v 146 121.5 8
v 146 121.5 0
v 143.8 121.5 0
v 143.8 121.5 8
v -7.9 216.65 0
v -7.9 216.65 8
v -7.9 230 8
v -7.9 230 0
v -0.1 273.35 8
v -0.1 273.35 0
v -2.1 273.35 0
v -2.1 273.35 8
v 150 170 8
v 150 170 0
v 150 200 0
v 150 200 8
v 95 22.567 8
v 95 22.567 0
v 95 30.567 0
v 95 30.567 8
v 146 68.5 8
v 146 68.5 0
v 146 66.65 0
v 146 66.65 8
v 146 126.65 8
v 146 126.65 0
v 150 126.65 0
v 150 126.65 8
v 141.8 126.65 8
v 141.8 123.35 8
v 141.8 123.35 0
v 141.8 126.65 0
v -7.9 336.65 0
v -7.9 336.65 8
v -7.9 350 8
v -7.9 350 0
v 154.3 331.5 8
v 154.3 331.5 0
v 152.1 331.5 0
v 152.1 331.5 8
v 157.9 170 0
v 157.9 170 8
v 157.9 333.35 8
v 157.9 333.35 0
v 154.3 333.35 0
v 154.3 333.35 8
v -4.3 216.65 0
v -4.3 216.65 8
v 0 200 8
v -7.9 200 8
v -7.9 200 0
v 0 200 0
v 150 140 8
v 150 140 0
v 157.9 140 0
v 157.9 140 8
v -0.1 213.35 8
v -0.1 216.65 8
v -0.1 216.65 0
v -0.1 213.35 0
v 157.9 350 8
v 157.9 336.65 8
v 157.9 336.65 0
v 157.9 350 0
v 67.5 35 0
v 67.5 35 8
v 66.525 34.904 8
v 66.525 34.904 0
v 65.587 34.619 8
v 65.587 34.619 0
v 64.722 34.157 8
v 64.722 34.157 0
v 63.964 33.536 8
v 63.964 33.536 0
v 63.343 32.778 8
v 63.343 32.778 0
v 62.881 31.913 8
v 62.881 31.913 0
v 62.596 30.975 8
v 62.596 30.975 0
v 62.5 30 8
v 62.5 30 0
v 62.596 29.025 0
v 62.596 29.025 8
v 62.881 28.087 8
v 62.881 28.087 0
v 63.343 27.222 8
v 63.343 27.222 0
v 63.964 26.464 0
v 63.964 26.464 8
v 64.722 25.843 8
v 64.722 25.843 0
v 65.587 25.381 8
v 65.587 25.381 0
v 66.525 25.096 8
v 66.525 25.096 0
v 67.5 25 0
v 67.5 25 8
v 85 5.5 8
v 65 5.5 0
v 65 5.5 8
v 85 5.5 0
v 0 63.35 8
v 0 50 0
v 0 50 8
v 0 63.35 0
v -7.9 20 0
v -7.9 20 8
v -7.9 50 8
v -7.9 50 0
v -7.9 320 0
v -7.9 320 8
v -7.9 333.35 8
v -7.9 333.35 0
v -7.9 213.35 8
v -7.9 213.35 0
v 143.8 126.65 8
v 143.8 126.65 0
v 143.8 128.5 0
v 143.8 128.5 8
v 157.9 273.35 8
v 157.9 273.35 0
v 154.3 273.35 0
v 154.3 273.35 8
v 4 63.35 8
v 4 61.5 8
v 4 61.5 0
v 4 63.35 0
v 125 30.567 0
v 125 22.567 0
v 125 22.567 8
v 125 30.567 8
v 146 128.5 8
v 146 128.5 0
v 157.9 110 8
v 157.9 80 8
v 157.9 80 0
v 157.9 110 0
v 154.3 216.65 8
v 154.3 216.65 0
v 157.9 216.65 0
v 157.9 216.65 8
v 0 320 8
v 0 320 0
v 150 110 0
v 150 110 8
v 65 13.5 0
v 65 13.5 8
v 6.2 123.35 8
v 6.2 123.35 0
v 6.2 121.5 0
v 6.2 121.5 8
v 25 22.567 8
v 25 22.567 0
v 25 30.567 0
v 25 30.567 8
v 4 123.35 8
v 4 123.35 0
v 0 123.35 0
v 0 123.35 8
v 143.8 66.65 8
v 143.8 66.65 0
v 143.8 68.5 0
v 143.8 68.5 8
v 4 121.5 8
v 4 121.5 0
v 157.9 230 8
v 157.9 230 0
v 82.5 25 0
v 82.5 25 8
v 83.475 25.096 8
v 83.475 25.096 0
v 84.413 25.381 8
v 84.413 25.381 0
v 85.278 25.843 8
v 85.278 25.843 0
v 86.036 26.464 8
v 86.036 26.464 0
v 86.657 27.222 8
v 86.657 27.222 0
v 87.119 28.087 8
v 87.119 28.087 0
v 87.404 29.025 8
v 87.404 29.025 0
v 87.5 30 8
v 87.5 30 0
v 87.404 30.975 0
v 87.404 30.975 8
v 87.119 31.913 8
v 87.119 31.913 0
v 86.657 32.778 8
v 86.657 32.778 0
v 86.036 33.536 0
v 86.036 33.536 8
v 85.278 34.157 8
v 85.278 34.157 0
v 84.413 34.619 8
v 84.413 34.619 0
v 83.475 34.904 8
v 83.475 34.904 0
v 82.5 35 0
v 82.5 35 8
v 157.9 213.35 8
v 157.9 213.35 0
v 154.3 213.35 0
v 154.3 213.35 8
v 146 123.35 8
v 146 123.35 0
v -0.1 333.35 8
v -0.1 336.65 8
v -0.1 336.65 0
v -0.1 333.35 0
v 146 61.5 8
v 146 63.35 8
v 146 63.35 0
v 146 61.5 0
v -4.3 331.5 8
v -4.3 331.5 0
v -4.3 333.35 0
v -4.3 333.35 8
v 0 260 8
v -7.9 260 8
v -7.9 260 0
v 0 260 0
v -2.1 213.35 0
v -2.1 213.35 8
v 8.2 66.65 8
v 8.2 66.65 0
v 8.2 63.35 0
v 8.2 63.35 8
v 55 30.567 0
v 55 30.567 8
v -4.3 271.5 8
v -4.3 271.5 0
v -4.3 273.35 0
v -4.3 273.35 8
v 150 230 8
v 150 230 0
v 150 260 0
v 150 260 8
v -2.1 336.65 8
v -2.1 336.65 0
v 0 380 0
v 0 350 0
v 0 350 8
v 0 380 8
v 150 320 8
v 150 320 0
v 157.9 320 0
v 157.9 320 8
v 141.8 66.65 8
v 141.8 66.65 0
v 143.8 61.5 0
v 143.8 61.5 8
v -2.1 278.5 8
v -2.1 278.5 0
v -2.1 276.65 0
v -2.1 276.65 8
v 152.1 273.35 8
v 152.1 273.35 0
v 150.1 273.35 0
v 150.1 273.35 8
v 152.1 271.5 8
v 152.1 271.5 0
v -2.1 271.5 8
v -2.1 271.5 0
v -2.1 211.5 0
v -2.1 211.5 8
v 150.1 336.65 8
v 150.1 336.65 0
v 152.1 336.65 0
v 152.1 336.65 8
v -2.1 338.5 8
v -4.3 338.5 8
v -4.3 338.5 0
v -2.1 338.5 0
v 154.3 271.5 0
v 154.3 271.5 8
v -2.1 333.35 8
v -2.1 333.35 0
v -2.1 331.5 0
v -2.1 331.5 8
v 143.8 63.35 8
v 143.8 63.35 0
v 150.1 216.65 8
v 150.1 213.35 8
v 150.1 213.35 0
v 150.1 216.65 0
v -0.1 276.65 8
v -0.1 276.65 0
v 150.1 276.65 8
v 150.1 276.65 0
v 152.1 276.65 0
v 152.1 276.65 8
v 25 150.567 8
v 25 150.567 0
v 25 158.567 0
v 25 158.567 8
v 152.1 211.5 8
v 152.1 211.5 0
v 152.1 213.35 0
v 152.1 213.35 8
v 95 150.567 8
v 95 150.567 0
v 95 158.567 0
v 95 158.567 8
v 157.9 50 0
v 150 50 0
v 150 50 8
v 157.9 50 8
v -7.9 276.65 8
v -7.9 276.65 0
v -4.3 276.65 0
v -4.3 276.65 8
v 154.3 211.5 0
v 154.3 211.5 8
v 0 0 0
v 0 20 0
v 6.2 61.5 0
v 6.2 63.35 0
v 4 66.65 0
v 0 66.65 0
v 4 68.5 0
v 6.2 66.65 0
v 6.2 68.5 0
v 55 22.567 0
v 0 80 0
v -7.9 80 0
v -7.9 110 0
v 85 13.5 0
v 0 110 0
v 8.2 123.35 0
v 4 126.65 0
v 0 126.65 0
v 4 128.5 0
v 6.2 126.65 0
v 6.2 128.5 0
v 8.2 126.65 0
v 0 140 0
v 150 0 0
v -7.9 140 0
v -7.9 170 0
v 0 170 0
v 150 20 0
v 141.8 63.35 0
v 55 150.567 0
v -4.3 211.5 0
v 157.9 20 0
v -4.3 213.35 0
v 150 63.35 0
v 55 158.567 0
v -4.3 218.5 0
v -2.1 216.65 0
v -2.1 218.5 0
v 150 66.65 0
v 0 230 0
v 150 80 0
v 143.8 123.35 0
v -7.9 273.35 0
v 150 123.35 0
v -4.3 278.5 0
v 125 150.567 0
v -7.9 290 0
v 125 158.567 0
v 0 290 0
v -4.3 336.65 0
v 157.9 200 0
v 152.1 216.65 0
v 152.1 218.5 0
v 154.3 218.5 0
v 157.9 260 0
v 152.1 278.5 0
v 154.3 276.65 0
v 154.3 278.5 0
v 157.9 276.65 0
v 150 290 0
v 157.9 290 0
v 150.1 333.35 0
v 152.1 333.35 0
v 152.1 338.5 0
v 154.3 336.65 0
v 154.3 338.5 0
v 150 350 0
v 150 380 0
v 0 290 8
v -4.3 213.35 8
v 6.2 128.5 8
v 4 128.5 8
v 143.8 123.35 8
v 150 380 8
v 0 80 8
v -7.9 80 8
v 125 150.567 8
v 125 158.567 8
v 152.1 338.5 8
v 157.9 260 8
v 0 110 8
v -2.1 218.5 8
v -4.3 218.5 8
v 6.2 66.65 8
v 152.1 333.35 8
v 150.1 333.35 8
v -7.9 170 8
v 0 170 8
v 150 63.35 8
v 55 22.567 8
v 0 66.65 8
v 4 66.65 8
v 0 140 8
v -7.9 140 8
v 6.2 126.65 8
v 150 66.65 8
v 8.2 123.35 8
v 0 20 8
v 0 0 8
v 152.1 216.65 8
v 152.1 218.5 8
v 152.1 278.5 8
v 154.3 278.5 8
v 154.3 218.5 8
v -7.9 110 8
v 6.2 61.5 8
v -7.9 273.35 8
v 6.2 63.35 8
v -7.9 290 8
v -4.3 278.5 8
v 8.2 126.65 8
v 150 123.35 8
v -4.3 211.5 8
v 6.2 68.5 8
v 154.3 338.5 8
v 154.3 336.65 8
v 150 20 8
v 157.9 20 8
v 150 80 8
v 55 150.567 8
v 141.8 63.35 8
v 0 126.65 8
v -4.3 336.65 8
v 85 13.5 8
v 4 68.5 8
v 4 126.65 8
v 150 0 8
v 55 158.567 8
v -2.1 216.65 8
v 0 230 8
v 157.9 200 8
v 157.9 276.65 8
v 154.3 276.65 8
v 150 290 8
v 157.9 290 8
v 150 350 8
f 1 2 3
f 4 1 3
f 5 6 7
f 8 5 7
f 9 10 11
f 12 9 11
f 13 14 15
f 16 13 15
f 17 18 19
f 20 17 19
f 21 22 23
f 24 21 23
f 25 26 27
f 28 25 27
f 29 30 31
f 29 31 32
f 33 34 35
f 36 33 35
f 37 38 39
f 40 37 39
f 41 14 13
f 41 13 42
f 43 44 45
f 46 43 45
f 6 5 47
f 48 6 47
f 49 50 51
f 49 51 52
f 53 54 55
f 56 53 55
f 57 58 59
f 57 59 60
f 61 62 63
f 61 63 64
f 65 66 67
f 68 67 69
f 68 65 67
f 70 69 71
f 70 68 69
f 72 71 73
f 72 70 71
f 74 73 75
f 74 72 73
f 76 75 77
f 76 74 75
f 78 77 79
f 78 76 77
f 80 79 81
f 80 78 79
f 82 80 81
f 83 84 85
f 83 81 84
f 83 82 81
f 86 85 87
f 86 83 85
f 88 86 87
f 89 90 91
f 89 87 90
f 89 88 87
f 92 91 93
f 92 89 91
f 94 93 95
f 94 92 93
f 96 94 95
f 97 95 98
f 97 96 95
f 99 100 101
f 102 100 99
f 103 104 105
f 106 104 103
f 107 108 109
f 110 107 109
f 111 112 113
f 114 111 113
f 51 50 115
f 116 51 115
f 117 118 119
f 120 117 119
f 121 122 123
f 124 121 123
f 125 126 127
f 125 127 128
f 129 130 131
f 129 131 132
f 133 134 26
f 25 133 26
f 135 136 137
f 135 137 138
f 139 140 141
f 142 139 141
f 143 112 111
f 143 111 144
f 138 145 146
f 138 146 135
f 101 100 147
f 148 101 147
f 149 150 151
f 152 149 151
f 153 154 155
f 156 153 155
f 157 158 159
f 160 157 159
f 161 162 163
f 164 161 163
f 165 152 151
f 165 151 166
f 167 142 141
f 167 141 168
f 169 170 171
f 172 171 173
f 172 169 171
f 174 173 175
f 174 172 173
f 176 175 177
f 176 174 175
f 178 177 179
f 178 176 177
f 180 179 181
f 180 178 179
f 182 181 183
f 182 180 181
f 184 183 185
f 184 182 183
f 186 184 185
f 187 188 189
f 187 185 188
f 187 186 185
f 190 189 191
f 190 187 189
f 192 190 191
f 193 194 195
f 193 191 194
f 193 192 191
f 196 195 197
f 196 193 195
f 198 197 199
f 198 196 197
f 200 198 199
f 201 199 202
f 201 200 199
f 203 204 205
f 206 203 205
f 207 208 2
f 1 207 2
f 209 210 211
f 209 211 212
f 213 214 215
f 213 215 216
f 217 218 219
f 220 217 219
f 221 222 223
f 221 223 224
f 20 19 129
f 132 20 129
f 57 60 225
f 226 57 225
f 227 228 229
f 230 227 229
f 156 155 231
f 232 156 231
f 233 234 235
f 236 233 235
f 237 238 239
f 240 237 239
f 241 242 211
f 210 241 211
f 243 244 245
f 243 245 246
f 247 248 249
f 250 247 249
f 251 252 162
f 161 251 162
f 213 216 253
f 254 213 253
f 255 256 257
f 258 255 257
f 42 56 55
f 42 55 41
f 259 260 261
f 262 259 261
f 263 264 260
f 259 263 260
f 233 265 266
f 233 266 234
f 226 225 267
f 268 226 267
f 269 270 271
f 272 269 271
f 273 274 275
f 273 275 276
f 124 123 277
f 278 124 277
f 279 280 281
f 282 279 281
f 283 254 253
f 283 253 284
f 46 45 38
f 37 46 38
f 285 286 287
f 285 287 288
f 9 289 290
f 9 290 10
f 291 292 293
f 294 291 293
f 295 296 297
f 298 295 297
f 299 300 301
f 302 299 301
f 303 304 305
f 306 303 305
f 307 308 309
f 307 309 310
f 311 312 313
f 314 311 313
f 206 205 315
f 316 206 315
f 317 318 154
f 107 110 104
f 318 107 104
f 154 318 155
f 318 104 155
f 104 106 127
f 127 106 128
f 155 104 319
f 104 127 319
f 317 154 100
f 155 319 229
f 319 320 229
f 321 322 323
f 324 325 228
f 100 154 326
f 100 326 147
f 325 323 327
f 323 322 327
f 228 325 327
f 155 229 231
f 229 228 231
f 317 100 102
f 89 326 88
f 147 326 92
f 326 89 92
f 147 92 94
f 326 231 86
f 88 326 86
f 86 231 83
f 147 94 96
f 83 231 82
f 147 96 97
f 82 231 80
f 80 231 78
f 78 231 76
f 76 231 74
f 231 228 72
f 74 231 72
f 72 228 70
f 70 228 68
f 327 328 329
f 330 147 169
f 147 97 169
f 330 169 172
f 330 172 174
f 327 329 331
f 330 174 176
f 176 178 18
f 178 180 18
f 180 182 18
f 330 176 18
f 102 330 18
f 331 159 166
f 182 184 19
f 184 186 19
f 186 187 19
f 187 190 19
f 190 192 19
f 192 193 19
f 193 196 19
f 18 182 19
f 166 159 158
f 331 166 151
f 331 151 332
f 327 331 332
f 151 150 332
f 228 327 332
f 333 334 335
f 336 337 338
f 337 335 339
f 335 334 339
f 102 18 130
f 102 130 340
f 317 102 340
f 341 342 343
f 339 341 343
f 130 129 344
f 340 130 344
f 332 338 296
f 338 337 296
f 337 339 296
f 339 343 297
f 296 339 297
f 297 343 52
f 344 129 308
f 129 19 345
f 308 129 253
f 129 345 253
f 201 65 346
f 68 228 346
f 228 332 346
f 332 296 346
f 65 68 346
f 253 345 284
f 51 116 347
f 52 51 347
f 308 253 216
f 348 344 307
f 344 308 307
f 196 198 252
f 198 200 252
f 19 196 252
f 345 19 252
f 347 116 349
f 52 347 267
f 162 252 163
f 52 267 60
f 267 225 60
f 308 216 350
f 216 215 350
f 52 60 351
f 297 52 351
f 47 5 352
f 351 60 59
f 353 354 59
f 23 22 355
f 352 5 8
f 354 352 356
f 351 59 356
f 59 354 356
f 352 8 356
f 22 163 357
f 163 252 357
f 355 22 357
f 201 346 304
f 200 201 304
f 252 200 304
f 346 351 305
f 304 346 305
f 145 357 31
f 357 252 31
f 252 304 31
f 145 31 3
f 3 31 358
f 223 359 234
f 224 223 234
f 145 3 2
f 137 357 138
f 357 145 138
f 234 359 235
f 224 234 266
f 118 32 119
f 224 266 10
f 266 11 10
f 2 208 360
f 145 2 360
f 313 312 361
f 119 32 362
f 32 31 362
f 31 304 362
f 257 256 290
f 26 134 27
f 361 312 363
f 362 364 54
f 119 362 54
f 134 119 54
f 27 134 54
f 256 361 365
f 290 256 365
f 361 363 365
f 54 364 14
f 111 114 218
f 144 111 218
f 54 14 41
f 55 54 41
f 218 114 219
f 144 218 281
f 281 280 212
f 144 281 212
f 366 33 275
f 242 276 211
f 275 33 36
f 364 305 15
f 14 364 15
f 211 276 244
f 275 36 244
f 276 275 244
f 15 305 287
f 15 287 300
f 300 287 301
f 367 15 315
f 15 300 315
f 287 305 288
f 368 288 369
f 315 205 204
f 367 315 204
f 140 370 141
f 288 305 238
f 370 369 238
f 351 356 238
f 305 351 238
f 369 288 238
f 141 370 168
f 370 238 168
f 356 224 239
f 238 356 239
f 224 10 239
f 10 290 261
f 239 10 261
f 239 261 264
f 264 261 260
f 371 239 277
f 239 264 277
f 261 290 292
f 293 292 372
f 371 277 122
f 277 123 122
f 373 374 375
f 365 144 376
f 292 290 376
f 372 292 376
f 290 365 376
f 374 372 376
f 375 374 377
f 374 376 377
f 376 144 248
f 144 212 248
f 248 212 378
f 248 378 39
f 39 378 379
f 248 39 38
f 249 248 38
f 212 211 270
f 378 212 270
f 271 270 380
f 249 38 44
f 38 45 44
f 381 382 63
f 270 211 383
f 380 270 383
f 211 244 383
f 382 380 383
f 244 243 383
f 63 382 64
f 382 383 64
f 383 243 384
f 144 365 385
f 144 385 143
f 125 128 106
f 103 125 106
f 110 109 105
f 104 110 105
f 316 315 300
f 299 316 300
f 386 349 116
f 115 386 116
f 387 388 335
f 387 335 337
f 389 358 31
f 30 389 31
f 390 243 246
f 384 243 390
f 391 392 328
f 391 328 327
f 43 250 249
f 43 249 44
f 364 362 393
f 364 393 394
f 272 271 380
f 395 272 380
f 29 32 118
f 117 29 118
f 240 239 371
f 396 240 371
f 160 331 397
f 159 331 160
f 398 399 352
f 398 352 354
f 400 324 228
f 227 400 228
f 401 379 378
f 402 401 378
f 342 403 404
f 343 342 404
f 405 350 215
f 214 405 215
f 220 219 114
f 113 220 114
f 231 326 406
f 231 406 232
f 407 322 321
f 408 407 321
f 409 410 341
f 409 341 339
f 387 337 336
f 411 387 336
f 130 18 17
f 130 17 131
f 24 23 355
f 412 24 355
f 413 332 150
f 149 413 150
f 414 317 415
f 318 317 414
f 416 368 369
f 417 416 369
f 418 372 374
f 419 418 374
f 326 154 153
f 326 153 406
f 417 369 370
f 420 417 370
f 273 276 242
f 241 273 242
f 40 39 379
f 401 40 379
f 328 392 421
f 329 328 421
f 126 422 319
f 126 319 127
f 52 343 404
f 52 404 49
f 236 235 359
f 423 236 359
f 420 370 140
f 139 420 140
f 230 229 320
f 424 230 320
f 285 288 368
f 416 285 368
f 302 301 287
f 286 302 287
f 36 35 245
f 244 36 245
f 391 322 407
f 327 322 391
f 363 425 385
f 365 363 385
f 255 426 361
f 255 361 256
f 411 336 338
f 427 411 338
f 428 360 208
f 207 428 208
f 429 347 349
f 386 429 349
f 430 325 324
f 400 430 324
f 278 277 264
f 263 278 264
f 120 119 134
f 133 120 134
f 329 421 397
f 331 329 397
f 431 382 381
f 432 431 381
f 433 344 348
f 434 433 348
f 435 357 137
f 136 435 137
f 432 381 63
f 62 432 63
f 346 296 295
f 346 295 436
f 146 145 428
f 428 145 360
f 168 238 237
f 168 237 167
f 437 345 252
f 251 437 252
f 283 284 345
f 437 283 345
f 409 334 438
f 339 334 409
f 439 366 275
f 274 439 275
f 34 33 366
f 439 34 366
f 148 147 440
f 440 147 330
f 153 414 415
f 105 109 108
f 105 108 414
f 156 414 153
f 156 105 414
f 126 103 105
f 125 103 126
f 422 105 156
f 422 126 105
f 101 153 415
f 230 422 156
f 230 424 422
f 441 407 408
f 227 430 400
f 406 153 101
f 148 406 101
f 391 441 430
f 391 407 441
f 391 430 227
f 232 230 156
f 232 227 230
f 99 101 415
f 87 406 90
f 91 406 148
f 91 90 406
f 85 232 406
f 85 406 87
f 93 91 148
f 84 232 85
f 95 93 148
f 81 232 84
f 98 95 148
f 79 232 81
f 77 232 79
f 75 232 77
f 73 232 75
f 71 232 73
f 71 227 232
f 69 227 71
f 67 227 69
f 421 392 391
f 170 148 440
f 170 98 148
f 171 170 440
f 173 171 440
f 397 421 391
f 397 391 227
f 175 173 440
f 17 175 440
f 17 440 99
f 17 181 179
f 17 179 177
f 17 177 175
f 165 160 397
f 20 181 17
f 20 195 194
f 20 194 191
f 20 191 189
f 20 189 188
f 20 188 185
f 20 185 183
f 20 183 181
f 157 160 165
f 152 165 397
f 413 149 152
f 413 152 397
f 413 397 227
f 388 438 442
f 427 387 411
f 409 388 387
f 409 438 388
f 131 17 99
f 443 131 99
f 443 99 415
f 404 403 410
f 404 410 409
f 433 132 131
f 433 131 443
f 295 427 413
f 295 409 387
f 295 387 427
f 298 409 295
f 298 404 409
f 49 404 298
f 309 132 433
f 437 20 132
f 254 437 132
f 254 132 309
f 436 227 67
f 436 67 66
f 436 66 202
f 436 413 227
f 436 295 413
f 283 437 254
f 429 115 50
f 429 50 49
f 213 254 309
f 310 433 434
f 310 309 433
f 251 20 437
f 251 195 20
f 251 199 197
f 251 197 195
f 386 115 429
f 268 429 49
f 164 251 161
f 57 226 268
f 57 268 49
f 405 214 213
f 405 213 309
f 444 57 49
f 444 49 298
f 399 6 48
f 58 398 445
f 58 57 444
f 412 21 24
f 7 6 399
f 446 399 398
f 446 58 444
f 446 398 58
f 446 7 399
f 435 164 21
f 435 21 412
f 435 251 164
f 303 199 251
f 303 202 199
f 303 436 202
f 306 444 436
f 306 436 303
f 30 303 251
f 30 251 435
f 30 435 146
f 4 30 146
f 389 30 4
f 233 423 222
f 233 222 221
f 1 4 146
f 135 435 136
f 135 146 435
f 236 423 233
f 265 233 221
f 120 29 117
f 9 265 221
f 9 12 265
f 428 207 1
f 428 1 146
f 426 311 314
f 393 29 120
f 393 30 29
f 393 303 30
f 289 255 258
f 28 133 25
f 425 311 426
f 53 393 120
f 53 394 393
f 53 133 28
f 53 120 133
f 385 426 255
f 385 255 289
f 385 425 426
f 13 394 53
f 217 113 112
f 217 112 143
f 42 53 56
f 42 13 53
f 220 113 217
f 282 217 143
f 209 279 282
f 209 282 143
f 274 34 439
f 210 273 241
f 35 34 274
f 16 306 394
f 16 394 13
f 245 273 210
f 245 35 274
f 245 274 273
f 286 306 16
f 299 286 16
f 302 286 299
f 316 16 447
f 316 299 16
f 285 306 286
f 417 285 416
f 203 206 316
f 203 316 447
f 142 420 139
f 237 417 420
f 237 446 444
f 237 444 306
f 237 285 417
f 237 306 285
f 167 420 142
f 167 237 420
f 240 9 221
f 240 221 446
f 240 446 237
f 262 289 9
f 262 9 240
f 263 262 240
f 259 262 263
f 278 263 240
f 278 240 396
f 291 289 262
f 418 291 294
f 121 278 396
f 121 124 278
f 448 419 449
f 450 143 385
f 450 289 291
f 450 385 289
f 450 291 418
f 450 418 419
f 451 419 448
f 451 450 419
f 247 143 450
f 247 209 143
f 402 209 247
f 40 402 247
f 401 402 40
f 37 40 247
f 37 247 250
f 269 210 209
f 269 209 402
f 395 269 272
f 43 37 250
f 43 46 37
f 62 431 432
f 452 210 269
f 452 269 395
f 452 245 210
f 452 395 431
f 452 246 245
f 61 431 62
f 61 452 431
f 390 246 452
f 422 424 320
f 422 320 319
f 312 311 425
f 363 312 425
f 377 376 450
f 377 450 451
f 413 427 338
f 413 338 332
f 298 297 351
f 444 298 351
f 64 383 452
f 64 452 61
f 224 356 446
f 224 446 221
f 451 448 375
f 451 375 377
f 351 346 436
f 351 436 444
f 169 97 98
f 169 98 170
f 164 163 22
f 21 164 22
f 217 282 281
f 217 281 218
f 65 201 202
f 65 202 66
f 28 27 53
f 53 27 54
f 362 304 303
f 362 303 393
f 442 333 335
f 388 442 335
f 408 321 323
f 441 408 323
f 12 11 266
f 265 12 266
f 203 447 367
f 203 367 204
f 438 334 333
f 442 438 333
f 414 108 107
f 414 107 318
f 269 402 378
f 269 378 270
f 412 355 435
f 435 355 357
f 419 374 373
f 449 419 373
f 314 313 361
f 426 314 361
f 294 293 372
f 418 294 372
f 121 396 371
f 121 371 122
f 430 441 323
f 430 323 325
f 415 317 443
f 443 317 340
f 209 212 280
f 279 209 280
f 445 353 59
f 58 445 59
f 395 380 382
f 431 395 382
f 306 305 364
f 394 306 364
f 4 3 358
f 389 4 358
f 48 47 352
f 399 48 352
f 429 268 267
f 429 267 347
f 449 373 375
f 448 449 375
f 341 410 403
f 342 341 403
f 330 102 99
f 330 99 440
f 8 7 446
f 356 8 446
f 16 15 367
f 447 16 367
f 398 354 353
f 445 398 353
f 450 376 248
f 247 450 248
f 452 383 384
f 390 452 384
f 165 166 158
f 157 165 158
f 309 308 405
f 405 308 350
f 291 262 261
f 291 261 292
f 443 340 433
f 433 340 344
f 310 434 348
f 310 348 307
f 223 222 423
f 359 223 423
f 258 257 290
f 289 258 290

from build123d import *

# Parameters (mm, degrees)
SKETCH1_W           = 150
SKETCH1_H           = 380
SKETCH1_W_2         = 30
SKETCH1_H_2         = 8
SKETCH1_W_3         = 20
BOSS_EXTRUDE1_DEPTH = 8
SKETCH2_W           = 7.9
SKETCH2_H           = 30
BOSS_EXTRUDE2_DEPTH = 8
CUT_EXTRUDE2_DEPTH  = 9


with BuildPart() as part:
    # Sketch1 → Boss-Extrude1 (new body)
    with BuildSketch(Plane.XY):
        with Locations((75, 190)):
            Rectangle(SKETCH1_W, SKETCH1_H)
        with Locations((40, 154.566938385)):
            Rectangle(SKETCH1_W_2, SKETCH1_H_2, mode=Mode.SUBTRACT)
        with Locations((110, 154.566938385)):
            Rectangle(SKETCH1_W_2, SKETCH1_H_2, mode=Mode.SUBTRACT)
        with Locations((40, 26.566938385)):
            Rectangle(SKETCH1_W_2, SKETCH1_H_2, mode=Mode.SUBTRACT)
        with Locations((110, 26.566938385)):
            Rectangle(SKETCH1_W_2, SKETCH1_H_2, mode=Mode.SUBTRACT)
        with Locations((75, 9.5)):
            Rectangle(SKETCH1_W_3, SKETCH1_H_2, mode=Mode.SUBTRACT)
    extrude(amount=BOSS_EXTRUDE1_DEPTH)

    # Sketch2 → Boss-Extrude2 (add)
    with BuildSketch(Plane.XY.offset(8)):
        with Locations((153.95, 335)):
            Rectangle(SKETCH2_W, SKETCH2_H)
        with Locations((-3.95, 335)):
            Rectangle(SKETCH2_W, SKETCH2_H)
        with Locations((153.95, 275)):
            Rectangle(SKETCH2_W, SKETCH2_H)
        with Locations((-3.95, 275)):
            Rectangle(SKETCH2_W, SKETCH2_H)
        with Locations((153.95, 215)):
            Rectangle(SKETCH2_W, SKETCH2_H)
        with Locations((-3.95, 215)):
            Rectangle(SKETCH2_W, SKETCH2_H)
        with Locations((153.95, 155)):
            Rectangle(SKETCH2_W, SKETCH2_H)
        with Locations((-3.95, 155)):
            Rectangle(SKETCH2_W, SKETCH2_H)
        with Locations((153.95, 95)):
            Rectangle(SKETCH2_W, SKETCH2_H)
        with Locations((-3.95, 95)):
            Rectangle(SKETCH2_W, SKETCH2_H)
        with Locations((153.95, 35)):
            Rectangle(SKETCH2_W, SKETCH2_H)
        with Locations((-3.95, 35)):
            Rectangle(SKETCH2_W, SKETCH2_H)
    extrude(amount=-BOSS_EXTRUDE2_DEPTH)

    # Sketch3 → Cut-Extrude2 (cut, through all)
    with BuildSketch(Plane(origin=(0, 0, 0), x_dir=(-1, 0, 0), z_dir=(0, 0, -1))):
        with BuildLine():
            Line((-67.5, 25), (-82.5, 25))
            ThreePointArc((-82.5, 25), (-87.5, 30), (-82.5, 35))
            Line((-82.5, 35), (-67.5, 35))
            ThreePointArc((-67.5, 35), (-62.5, 30), (-67.5, 25))
        make_face()
        Polygon((7.9, 336.65), (4.3, 336.65), (4.3, 338.5), (2.1, 338.5), (2.1, 336.65), (0.1, 336.65), (0.1, 333.35), (2.1, 333.35), (2.1, 331.5), (4.3, 331.5), (4.3, 333.35), (7.9, 333.35), align=None)
        Polygon((-157.9, 213.35), (-154.3, 213.35), (-154.3, 211.5), (-152.1, 211.5), (-152.1, 213.35), (-150.1, 213.35), (-150.1, 216.65), (-152.1, 216.65), (-152.1, 218.5), (-154.3, 218.5), (-154.3, 216.65), (-157.9, 216.65), align=None)
        Polygon((-157.9, 273.35), (-154.3, 273.35), (-154.3, 271.5), (-152.1, 271.5), (-152.1, 273.35), (-150.1, 273.35), (-150.1, 276.65), (-152.1, 276.65), (-152.1, 278.5), (-154.3, 278.5), (-154.3, 276.65), (-157.9, 276.65), align=None)
        Polygon((7.9, 276.65), (4.3, 276.65), (4.3, 278.5), (2.1, 278.5), (2.1, 276.65), (0.1, 276.65), (0.1, 273.35), (2.1, 273.35), (2.1, 271.5), (4.3, 271.5), (4.3, 273.35), (7.9, 273.35), align=None)
        Polygon((7.9, 216.65), (4.3, 216.65), (4.3, 218.5), (2.1, 218.5), (2.1, 216.65), (0.1, 216.65), (0.1, 213.35), (2.1, 213.35), (2.1, 211.5), (4.3, 211.5), (4.3, 213.35), (7.9, 213.35), align=None)
        Polygon((-157.9, 333.35), (-154.3, 333.35), (-154.3, 331.5), (-152.1, 331.5), (-152.1, 333.35), (-150.1, 333.35), (-150.1, 336.65), (-152.1, 336.65), (-152.1, 338.5), (-154.3, 338.5), (-154.3, 336.65), (-157.9, 336.65), align=None)
        Polygon((0, 123.35), (0, 126.65), (-4, 126.65), (-4, 128.5), (-6.2, 128.5), (-6.2, 126.65), (-8.2, 126.65), (-8.2, 123.35), (-6.2, 123.35), (-6.2, 121.5), (-4, 121.5), (-4, 123.35), align=None)
        Polygon((0, 63.35), (0, 66.65), (-4, 66.65), (-4, 68.5), (-6.2, 68.5), (-6.2, 66.65), (-8.2, 66.65), (-8.2, 63.35), (-6.2, 63.35), (-6.2, 61.5), (-4, 61.5), (-4, 63.35), align=None)
        Polygon((-150, 63.35), (-146, 63.35), (-146, 61.5), (-143.8, 61.5), (-143.8, 63.35), (-141.8, 63.35), (-141.8, 66.65), (-143.8, 66.65), (-143.8, 68.5), (-146, 68.5), (-146, 66.65), (-150, 66.65), align=None)
        Polygon((-150, 123.35), (-146, 123.35), (-146, 121.5), (-143.8, 121.5), (-143.8, 123.35), (-141.8, 123.35), (-141.8, 126.65), (-143.8, 126.65), (-143.8, 128.5), (-146, 128.5), (-146, 126.65), (-150, 126.65), align=None)
    extrude(amount=-CUT_EXTRUDE2_DEPTH, mode=Mode.SUBTRACT)


solid = part.part
